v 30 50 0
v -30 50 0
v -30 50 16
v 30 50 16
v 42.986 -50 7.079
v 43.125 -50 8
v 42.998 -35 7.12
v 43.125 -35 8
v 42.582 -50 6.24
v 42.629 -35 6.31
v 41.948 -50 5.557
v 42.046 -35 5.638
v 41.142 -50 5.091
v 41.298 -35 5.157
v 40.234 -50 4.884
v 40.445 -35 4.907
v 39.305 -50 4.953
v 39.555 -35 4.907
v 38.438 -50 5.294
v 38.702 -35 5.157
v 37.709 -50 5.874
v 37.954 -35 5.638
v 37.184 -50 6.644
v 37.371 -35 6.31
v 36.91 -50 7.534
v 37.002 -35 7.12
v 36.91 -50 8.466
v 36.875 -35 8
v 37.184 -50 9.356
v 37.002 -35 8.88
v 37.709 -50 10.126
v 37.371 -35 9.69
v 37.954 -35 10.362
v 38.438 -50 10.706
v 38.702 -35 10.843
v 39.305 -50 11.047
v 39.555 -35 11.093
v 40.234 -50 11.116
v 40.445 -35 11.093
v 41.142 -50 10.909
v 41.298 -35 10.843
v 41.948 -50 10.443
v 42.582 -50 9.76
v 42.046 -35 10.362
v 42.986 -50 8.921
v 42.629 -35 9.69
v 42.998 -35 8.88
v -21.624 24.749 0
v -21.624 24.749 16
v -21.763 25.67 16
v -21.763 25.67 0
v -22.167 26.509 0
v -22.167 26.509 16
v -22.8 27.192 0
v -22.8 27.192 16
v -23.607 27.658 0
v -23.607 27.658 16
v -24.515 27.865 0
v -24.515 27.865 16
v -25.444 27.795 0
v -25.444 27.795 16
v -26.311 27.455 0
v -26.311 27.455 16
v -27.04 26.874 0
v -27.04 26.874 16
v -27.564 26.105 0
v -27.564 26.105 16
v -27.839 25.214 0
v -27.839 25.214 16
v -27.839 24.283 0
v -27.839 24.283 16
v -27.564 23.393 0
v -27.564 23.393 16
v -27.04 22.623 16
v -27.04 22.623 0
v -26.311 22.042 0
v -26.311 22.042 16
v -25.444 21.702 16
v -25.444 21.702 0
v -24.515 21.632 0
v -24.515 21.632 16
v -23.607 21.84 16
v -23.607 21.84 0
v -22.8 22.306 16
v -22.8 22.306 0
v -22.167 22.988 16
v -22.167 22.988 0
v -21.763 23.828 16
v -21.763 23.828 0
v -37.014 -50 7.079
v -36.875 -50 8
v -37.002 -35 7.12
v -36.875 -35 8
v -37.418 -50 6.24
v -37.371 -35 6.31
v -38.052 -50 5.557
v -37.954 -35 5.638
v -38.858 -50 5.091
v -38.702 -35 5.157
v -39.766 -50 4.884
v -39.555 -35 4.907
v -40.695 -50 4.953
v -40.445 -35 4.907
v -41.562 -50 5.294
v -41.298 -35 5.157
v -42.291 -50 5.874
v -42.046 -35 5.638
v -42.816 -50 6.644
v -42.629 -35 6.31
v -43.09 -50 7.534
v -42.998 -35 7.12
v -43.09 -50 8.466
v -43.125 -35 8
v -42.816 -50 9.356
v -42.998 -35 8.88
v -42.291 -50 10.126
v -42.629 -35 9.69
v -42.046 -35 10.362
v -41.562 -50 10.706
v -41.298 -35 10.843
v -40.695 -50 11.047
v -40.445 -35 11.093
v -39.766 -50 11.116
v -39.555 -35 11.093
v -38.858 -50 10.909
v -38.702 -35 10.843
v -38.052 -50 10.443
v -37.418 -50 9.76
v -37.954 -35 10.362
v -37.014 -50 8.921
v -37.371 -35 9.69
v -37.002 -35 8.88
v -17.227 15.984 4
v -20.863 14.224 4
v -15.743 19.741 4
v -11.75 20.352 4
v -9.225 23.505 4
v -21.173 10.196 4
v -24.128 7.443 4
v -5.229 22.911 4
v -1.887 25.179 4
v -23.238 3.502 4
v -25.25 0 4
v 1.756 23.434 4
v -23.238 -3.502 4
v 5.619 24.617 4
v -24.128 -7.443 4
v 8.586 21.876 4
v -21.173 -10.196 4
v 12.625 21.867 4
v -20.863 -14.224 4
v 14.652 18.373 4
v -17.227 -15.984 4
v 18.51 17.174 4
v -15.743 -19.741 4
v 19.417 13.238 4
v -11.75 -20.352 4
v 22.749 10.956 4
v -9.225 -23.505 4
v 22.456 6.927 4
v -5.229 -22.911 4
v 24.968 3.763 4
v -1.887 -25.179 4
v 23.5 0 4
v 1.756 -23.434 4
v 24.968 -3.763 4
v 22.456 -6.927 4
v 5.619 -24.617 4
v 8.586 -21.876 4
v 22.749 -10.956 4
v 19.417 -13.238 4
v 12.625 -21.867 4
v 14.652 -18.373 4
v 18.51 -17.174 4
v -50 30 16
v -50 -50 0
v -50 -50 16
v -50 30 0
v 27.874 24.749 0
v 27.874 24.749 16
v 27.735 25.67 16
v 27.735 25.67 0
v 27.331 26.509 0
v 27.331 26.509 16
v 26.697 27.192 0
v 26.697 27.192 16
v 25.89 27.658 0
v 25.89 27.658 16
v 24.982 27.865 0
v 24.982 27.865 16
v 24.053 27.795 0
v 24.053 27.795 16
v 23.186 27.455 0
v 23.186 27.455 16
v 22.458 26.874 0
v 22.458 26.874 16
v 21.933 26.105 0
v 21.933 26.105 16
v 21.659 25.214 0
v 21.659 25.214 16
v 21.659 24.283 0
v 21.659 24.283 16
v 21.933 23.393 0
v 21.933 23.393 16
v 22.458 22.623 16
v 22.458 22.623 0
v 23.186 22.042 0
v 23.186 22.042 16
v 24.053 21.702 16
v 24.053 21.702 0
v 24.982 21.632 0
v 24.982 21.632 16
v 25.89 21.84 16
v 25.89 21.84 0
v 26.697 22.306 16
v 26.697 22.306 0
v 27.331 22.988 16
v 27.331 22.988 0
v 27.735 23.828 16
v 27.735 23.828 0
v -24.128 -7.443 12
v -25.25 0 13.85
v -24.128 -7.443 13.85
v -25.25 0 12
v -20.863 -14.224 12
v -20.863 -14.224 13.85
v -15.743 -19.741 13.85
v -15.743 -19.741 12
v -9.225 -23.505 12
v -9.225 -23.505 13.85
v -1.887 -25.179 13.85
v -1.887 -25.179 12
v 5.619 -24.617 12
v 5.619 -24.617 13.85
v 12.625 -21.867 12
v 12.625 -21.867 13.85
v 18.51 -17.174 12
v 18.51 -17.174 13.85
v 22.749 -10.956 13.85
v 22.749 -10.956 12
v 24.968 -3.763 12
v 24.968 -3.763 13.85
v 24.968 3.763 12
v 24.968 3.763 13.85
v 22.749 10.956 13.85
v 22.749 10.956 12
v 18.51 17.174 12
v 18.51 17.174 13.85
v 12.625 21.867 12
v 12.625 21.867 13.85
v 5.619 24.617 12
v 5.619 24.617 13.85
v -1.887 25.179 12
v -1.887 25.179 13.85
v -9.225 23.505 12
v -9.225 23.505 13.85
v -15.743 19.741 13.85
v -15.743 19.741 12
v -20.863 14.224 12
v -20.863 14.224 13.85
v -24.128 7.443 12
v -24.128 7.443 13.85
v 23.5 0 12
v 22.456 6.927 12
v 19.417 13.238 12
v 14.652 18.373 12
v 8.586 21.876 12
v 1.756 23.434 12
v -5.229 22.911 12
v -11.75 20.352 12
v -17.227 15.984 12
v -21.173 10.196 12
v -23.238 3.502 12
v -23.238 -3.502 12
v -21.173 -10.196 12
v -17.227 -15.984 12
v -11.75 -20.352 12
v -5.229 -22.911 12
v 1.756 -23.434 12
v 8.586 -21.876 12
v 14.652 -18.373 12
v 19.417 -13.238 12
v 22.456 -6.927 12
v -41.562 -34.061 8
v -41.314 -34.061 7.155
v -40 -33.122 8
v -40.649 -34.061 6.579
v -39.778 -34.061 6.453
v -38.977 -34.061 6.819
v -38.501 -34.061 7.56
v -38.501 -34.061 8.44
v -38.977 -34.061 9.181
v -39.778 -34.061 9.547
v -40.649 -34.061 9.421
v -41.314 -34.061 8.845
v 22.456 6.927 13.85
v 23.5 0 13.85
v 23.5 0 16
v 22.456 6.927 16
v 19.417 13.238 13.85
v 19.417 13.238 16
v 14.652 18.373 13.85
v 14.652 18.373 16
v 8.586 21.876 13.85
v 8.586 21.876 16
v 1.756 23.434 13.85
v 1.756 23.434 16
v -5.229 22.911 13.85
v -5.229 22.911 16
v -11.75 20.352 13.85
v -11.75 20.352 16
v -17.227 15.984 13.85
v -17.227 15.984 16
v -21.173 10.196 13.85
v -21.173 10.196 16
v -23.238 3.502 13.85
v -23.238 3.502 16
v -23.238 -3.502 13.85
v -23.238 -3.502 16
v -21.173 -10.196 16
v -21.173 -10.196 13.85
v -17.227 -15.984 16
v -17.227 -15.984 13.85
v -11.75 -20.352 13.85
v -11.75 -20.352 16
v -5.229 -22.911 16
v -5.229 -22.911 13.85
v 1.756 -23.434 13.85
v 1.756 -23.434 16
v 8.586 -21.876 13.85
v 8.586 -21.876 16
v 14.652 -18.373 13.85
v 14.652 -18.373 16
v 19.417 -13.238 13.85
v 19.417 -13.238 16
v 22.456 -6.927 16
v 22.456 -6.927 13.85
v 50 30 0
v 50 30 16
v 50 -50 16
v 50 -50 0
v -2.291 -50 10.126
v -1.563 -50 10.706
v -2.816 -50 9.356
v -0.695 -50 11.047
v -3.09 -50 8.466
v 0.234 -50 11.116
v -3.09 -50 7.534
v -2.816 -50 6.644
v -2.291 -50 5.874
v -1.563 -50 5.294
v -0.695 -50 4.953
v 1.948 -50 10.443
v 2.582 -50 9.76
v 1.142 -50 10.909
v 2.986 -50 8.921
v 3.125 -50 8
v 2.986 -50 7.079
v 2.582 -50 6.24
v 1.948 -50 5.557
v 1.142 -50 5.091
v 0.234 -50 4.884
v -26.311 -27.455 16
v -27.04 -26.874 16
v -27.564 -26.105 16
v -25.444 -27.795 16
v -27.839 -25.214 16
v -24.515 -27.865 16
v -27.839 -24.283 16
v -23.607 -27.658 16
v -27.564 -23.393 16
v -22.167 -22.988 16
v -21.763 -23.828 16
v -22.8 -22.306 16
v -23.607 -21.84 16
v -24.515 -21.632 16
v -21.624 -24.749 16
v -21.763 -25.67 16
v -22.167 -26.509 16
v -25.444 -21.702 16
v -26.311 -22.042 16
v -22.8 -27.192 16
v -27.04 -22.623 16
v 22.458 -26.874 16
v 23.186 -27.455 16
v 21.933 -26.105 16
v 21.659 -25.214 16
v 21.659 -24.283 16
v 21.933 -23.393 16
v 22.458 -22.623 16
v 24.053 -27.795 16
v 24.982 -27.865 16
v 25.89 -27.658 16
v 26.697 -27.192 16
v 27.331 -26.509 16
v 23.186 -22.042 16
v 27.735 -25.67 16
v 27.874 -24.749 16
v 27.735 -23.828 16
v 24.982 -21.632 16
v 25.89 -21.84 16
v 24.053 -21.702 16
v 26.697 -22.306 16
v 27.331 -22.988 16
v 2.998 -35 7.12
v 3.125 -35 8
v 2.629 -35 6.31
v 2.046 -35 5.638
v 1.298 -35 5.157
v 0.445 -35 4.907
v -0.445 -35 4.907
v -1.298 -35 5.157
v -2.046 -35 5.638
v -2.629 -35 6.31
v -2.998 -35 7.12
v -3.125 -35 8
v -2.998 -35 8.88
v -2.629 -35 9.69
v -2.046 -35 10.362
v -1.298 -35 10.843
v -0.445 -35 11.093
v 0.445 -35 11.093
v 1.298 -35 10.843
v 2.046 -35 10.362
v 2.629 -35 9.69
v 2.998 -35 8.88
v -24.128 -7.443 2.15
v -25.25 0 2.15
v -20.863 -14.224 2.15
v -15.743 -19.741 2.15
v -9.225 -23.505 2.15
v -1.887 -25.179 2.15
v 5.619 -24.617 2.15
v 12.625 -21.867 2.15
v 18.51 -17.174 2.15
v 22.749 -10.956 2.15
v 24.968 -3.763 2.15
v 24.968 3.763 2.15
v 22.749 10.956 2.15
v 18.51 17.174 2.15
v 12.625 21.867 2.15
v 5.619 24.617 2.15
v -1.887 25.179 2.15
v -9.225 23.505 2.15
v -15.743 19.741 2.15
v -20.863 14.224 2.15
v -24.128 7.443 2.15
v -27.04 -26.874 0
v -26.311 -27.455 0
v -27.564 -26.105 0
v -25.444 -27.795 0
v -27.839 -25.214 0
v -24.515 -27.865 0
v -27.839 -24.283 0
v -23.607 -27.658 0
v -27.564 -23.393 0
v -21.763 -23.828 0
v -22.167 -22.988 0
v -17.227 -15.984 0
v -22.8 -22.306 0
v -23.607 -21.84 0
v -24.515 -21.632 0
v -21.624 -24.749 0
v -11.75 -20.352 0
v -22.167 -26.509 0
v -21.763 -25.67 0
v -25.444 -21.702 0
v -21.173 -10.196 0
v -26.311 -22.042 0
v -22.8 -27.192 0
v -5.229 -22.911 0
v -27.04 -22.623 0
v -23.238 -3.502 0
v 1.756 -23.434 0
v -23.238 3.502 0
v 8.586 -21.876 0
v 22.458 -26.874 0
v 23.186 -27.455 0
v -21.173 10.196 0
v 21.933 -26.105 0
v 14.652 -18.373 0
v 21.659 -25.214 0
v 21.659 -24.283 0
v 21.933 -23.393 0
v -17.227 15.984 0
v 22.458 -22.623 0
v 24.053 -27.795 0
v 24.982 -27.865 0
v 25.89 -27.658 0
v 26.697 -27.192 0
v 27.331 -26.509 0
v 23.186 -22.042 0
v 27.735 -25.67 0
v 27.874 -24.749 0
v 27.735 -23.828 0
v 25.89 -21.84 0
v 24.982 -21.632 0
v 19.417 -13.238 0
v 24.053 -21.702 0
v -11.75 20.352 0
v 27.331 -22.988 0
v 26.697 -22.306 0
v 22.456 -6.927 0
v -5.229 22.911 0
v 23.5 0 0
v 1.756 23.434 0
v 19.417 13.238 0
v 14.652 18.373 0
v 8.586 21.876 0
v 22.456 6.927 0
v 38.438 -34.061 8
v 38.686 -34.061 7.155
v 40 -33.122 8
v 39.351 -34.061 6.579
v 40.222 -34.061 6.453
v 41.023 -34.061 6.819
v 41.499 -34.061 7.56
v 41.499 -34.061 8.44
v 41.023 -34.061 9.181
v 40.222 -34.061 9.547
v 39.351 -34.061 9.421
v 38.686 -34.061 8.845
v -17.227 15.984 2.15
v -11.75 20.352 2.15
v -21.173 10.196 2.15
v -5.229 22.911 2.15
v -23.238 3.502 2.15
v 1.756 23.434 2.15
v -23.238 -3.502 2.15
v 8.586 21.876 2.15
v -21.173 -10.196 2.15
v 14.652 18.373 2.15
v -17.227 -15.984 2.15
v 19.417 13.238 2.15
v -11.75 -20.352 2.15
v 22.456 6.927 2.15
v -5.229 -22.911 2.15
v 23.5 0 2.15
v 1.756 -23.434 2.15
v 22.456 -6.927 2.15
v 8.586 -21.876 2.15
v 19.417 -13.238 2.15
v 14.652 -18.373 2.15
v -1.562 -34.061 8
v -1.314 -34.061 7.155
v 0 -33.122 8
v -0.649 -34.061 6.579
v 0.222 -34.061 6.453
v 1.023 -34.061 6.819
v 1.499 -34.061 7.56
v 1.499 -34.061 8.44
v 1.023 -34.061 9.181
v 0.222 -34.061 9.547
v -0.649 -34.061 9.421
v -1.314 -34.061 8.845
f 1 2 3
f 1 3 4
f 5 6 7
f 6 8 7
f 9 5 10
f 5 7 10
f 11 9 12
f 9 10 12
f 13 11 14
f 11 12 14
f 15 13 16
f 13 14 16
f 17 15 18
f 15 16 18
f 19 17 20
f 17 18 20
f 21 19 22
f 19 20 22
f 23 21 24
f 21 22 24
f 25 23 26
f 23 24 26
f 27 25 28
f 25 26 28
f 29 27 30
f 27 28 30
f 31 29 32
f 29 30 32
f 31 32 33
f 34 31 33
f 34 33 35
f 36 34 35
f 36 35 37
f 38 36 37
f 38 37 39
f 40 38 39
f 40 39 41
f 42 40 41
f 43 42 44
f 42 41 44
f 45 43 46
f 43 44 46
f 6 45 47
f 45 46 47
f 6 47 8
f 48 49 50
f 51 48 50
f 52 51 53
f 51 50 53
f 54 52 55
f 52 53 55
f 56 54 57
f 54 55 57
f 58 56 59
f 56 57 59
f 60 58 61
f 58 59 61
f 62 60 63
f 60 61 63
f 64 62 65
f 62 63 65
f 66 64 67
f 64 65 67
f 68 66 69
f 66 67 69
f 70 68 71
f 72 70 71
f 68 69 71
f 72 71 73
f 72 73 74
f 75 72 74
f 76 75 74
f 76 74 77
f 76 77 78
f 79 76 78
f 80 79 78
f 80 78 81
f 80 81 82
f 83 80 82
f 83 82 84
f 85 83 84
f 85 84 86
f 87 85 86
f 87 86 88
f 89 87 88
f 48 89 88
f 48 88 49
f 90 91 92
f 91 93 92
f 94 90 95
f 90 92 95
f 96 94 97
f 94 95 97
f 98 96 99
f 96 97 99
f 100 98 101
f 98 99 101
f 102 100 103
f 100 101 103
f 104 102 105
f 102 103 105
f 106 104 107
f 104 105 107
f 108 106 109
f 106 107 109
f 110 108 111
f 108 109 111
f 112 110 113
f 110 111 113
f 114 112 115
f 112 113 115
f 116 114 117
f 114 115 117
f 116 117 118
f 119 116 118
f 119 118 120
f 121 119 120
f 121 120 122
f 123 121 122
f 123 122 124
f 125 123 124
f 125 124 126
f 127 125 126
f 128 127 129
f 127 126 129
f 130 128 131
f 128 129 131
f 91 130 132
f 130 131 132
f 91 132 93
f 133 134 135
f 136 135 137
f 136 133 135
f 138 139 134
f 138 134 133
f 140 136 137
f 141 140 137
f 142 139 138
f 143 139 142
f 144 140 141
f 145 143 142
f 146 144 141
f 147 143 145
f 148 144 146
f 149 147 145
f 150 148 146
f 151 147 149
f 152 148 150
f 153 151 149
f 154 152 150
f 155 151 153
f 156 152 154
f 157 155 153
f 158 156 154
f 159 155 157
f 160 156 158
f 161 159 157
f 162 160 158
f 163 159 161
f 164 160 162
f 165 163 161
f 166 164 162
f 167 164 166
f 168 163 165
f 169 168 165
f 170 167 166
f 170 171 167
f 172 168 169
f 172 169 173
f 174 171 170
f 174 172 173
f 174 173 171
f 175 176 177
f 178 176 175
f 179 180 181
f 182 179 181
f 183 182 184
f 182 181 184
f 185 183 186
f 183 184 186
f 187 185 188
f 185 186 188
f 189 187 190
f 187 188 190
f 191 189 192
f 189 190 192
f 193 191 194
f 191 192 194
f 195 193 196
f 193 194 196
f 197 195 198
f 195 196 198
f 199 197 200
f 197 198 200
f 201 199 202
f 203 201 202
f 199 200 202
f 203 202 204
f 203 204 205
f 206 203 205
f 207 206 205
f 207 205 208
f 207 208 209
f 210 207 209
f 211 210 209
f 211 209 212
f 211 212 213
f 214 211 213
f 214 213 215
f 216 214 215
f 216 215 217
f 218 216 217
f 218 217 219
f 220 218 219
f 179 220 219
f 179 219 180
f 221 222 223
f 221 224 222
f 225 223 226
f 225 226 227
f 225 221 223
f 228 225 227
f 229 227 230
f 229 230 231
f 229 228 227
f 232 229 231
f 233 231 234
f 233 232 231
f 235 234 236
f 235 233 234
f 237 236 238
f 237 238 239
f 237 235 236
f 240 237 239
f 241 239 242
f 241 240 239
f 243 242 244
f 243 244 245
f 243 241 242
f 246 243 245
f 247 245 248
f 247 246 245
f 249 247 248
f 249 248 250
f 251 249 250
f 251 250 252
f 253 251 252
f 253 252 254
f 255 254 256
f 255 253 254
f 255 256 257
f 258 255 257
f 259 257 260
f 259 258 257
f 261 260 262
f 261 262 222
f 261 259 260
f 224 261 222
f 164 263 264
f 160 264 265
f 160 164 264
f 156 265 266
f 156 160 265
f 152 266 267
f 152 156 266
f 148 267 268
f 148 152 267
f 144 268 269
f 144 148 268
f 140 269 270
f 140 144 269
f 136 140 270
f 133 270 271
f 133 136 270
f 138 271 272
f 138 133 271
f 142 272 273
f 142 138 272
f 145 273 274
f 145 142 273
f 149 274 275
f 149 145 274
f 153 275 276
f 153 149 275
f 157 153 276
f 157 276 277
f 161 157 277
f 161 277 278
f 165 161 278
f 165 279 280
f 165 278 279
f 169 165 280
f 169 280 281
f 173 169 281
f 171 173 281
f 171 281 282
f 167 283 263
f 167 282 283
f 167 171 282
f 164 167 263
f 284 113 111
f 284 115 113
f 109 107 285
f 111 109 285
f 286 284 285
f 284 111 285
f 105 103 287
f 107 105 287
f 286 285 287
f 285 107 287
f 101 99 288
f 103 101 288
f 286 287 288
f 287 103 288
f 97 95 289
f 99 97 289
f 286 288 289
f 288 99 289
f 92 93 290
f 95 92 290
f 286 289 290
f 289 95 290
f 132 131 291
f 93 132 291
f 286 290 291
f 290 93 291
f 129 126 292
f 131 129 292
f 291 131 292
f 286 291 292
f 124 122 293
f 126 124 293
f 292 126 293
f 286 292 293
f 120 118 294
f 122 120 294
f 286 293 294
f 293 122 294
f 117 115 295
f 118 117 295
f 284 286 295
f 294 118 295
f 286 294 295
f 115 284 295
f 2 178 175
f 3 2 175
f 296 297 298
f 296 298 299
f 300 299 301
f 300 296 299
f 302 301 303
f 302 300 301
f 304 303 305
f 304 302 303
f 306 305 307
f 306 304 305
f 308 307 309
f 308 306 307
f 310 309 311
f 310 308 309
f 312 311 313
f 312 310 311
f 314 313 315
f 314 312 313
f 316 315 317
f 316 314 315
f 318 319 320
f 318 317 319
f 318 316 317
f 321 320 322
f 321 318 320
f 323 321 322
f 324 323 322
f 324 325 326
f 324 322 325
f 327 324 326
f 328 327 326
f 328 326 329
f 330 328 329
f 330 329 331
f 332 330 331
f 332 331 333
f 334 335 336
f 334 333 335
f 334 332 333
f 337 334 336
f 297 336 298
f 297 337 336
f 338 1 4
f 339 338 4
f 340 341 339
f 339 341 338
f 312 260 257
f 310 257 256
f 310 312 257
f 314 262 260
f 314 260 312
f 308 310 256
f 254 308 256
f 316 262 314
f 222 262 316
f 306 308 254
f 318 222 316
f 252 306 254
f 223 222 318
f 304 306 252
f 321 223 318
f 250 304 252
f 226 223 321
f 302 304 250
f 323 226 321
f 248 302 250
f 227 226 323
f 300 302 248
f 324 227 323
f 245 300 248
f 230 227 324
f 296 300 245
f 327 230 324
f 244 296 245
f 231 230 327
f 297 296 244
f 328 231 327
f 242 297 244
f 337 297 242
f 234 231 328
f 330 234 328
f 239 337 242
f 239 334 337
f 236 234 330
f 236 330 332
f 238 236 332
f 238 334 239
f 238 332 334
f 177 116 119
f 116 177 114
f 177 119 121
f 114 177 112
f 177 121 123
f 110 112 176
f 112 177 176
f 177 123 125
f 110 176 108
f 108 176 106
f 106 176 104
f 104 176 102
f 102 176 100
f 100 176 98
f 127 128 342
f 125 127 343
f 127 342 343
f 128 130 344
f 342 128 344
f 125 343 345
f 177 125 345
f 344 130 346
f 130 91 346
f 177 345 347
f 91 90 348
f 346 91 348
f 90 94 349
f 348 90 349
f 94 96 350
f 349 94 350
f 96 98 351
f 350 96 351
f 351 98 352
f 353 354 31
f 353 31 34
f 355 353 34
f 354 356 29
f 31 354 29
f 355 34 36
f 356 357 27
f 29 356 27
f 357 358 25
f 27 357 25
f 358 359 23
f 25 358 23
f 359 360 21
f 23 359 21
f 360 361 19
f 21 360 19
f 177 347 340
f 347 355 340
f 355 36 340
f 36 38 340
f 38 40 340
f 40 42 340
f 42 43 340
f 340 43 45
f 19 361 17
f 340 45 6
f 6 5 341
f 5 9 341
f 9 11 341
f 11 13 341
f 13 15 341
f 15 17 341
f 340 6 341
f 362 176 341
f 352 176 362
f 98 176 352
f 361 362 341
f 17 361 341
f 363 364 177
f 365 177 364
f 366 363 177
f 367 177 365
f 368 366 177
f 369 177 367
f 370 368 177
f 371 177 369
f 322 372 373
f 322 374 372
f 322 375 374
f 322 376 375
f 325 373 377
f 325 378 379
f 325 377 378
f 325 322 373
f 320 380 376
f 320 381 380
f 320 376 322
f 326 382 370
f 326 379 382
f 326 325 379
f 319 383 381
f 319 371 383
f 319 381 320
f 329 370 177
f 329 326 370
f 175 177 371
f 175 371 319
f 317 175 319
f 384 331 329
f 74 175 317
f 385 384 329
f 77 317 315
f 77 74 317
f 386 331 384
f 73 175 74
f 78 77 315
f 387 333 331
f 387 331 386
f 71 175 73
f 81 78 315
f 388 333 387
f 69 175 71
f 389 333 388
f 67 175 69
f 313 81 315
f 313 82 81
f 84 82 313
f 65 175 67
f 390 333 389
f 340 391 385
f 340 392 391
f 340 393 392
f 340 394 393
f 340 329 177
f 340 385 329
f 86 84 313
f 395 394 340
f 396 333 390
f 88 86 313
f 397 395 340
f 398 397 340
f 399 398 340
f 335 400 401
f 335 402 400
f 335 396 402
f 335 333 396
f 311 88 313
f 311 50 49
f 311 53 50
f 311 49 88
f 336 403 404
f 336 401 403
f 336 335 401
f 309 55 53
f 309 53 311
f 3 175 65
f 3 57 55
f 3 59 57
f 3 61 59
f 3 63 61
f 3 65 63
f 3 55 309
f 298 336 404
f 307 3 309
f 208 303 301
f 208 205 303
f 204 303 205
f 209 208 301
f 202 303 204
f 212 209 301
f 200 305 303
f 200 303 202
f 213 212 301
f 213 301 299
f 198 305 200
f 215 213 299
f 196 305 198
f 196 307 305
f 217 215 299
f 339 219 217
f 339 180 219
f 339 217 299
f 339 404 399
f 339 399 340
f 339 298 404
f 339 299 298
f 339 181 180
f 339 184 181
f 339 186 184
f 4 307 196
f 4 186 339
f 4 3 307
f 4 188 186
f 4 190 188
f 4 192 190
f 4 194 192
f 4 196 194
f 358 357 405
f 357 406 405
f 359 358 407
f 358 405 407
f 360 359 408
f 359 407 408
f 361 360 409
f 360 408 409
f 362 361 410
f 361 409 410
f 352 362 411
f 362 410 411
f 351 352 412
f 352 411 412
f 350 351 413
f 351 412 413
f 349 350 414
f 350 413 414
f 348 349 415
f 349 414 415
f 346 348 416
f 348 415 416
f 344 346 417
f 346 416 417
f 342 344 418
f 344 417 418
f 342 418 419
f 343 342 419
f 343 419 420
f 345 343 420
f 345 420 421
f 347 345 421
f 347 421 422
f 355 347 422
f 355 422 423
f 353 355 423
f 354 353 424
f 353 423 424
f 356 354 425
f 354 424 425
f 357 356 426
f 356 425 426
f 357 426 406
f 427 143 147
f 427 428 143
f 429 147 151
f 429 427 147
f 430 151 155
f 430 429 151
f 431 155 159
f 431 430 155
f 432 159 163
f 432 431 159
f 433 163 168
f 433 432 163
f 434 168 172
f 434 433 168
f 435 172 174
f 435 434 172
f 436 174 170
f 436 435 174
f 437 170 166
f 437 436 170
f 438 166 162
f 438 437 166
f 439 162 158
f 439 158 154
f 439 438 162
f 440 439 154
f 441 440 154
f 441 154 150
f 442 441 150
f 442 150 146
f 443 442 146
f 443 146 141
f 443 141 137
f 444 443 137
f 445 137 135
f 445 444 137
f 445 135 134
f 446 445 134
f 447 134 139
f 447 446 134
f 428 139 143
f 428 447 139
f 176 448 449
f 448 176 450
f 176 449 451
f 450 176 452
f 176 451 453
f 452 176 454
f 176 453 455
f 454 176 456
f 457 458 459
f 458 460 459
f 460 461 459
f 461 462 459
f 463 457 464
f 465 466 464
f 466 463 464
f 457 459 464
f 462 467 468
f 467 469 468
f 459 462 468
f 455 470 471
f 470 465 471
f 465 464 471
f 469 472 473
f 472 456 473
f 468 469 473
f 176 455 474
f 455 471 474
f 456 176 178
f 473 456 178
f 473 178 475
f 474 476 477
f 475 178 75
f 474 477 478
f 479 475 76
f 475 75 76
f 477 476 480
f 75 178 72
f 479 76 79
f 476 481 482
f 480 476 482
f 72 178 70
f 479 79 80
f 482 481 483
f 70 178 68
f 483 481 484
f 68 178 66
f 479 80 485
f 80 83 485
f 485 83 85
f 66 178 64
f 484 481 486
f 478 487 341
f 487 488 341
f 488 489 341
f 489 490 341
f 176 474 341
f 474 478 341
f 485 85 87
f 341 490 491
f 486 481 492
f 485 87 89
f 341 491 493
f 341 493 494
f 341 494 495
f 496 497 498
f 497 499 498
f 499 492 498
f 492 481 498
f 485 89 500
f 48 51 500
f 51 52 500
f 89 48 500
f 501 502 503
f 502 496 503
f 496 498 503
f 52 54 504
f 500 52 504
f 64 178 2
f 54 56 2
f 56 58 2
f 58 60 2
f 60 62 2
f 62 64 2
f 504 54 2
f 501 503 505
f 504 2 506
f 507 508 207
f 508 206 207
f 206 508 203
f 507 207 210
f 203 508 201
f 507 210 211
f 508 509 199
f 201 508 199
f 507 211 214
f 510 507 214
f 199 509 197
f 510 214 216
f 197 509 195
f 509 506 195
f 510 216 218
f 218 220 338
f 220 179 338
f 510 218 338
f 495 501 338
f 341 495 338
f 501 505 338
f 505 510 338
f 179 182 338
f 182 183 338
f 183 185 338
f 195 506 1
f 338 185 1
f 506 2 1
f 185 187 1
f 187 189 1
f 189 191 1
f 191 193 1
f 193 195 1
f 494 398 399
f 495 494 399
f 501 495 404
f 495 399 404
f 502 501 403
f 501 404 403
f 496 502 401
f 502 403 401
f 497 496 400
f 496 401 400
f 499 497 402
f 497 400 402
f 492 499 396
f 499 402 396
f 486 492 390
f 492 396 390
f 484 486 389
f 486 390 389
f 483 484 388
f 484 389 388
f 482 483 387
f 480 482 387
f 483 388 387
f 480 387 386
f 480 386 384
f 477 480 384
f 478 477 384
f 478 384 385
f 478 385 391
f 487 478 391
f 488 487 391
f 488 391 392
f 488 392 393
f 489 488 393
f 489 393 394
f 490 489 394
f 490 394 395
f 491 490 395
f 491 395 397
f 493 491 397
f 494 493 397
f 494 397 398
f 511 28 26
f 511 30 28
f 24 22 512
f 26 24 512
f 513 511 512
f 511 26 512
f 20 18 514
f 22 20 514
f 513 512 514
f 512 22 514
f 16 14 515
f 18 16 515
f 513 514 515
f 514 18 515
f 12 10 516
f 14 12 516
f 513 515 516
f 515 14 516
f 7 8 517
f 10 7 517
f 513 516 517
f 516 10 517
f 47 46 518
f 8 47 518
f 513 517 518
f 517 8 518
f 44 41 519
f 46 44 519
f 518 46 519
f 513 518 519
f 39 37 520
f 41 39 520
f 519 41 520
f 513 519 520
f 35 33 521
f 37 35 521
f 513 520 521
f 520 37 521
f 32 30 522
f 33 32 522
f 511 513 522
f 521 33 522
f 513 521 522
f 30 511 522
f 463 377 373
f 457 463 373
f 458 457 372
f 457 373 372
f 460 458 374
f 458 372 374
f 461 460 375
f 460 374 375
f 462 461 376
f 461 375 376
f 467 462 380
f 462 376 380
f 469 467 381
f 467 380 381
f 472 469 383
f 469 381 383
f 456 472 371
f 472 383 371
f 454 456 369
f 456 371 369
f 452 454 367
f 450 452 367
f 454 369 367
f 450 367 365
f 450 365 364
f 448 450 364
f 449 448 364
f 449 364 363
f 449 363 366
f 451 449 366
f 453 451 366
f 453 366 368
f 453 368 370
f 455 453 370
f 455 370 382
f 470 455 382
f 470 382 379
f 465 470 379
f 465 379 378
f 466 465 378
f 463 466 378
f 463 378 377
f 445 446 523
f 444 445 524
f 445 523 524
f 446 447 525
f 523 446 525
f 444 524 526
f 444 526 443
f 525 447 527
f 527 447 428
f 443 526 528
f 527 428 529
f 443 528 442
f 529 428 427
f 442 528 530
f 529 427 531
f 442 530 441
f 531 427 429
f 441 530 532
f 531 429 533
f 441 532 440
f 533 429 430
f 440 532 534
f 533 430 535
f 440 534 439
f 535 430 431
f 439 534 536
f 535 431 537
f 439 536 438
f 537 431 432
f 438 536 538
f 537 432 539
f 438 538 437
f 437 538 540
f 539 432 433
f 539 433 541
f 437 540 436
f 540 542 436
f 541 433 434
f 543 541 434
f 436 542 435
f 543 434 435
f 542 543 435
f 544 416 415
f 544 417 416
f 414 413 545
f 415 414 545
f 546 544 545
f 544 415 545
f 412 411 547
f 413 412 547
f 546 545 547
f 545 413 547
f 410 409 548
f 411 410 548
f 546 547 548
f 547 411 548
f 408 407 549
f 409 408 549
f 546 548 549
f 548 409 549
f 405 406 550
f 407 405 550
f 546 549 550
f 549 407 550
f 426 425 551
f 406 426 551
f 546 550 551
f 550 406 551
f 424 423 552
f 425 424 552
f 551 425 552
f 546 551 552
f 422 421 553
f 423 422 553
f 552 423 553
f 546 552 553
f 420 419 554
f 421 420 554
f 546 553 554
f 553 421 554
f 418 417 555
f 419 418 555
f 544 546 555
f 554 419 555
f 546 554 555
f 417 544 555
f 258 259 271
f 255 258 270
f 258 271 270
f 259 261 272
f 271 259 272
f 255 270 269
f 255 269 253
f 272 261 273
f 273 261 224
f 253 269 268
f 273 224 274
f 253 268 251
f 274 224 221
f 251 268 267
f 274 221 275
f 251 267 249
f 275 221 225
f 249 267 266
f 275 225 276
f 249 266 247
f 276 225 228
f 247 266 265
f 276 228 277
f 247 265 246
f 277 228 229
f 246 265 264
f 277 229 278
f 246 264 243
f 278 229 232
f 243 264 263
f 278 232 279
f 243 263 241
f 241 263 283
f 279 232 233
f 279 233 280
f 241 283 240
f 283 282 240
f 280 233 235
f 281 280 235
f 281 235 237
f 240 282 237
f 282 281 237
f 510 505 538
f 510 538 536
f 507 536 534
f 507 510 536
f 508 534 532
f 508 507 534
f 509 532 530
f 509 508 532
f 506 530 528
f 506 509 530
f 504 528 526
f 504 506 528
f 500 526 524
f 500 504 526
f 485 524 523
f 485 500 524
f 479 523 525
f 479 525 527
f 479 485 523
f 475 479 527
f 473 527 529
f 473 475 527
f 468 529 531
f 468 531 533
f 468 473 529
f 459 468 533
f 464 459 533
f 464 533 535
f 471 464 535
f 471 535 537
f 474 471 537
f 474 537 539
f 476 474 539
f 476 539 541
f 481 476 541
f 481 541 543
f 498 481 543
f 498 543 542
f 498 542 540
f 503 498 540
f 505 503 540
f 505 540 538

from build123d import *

# Parameters (mm, degrees)
SKETCH1_W                        = 100
SKETCH1_H                        = 100
BOSS_EXTRUDE1_DEPTH              = 16
CUT_EXTRUDE1_DEPTH               = 73.498275842
CUT_EXTRUDE1_DEPTH_BACK          = 73.498275842
SKETCH2_R                        = 23.5
SKETCH3_W                        = 1.85
SKETCH3_H                        = 1.75
TAP_DRILL_FOR_M6_HELICOIL1_D     = 6.25
TAP_DRILL_FOR_M6_HELICOIL1_DEPTH = 15
TAP_DRILL_FOR_M6_HELICOIL1_TIP   = 1.877689434
TAP_DRILL_FOR_M6_HELICOIL2_D     = 6.25
CHAMFER1_SIZE                    = 20


with BuildPart() as part:
    # Sketch1 → Boss-Extrude1 (new body)
    with BuildSketch(Plane.XY):
        Rectangle(SKETCH1_W, SKETCH1_H)
    extrude(amount=BOSS_EXTRUDE1_DEPTH)

    # Sketch2 → Cut-Extrude1 (cut, two sides: drawn at the far end of the back side and taken through both)
    with BuildSketch(Plane.XY.offset(16).offset(-CUT_EXTRUDE1_DEPTH_BACK)):
        Circle(SKETCH2_R)
    extrude(amount=CUT_EXTRUDE1_DEPTH + CUT_EXTRUDE1_DEPTH_BACK, mode=Mode.SUBTRACT)

    # Sketch3 → Cut-Revolve1 (revolve, cut)
    with BuildSketch(Plane(origin=(0, 0, 0), x_dir=(0, 0, -1), z_dir=(1, 0, 0)), mode=Mode.PRIVATE) as cut_revolve1_sk:
        with Locations((-12.925, 24.375)):
            Rectangle(SKETCH3_W, SKETCH3_H)
        with Locations((-3.075, 24.375)):
            Rectangle(SKETCH3_W, SKETCH3_H)
    revolve(cut_revolve1_sk.sketch.rotate(Axis((0, 0, 0), (0, 0, 1)), 90), axis=Axis((0, 0, 0), (0, 0, 1)), mode=Mode.SUBTRACT)

    # Tap Drill for M6 Helicoil1
    with Locations(Plane(origin=(0, -50, 0), x_dir=(-1, 0, 0), z_dir=(0, -1, 0))):
        with Locations((-40, -8), (0, -8), (40, -8)):
            Hole(TAP_DRILL_FOR_M6_HELICOIL1_D / 2, depth=TAP_DRILL_FOR_M6_HELICOIL1_DEPTH)
            with Locations((0, 0, -(TAP_DRILL_FOR_M6_HELICOIL1_DEPTH + TAP_DRILL_FOR_M6_HELICOIL1_TIP / 2))):  # 118° drill point
                Cone(0, TAP_DRILL_FOR_M6_HELICOIL1_D / 2, TAP_DRILL_FOR_M6_HELICOIL1_TIP, mode=Mode.SUBTRACT)

    # Tap Drill for M6 Helicoil2 (through all)
    with Locations(Plane(origin=(0, 0, 0), x_dir=(-1, 0, 0), z_dir=(0, 0, -1))):
        with Locations((-24.748737342, -24.748737342), (-24.748737342, 24.748737342), (24.748737342, 24.748737342), (24.748737342, -24.748737342)):
            Hole(TAP_DRILL_FOR_M6_HELICOIL2_D / 2)

    # Chamfer1
    chamfer1_edges = [part.edges().sort_by_distance(p)[0] for p in [
        (-50, 50, 8),
        (50, 50, 8),
    ]]
    chamfer(chamfer1_edges, length=CHAMFER1_SIZE)


solid = part.part
